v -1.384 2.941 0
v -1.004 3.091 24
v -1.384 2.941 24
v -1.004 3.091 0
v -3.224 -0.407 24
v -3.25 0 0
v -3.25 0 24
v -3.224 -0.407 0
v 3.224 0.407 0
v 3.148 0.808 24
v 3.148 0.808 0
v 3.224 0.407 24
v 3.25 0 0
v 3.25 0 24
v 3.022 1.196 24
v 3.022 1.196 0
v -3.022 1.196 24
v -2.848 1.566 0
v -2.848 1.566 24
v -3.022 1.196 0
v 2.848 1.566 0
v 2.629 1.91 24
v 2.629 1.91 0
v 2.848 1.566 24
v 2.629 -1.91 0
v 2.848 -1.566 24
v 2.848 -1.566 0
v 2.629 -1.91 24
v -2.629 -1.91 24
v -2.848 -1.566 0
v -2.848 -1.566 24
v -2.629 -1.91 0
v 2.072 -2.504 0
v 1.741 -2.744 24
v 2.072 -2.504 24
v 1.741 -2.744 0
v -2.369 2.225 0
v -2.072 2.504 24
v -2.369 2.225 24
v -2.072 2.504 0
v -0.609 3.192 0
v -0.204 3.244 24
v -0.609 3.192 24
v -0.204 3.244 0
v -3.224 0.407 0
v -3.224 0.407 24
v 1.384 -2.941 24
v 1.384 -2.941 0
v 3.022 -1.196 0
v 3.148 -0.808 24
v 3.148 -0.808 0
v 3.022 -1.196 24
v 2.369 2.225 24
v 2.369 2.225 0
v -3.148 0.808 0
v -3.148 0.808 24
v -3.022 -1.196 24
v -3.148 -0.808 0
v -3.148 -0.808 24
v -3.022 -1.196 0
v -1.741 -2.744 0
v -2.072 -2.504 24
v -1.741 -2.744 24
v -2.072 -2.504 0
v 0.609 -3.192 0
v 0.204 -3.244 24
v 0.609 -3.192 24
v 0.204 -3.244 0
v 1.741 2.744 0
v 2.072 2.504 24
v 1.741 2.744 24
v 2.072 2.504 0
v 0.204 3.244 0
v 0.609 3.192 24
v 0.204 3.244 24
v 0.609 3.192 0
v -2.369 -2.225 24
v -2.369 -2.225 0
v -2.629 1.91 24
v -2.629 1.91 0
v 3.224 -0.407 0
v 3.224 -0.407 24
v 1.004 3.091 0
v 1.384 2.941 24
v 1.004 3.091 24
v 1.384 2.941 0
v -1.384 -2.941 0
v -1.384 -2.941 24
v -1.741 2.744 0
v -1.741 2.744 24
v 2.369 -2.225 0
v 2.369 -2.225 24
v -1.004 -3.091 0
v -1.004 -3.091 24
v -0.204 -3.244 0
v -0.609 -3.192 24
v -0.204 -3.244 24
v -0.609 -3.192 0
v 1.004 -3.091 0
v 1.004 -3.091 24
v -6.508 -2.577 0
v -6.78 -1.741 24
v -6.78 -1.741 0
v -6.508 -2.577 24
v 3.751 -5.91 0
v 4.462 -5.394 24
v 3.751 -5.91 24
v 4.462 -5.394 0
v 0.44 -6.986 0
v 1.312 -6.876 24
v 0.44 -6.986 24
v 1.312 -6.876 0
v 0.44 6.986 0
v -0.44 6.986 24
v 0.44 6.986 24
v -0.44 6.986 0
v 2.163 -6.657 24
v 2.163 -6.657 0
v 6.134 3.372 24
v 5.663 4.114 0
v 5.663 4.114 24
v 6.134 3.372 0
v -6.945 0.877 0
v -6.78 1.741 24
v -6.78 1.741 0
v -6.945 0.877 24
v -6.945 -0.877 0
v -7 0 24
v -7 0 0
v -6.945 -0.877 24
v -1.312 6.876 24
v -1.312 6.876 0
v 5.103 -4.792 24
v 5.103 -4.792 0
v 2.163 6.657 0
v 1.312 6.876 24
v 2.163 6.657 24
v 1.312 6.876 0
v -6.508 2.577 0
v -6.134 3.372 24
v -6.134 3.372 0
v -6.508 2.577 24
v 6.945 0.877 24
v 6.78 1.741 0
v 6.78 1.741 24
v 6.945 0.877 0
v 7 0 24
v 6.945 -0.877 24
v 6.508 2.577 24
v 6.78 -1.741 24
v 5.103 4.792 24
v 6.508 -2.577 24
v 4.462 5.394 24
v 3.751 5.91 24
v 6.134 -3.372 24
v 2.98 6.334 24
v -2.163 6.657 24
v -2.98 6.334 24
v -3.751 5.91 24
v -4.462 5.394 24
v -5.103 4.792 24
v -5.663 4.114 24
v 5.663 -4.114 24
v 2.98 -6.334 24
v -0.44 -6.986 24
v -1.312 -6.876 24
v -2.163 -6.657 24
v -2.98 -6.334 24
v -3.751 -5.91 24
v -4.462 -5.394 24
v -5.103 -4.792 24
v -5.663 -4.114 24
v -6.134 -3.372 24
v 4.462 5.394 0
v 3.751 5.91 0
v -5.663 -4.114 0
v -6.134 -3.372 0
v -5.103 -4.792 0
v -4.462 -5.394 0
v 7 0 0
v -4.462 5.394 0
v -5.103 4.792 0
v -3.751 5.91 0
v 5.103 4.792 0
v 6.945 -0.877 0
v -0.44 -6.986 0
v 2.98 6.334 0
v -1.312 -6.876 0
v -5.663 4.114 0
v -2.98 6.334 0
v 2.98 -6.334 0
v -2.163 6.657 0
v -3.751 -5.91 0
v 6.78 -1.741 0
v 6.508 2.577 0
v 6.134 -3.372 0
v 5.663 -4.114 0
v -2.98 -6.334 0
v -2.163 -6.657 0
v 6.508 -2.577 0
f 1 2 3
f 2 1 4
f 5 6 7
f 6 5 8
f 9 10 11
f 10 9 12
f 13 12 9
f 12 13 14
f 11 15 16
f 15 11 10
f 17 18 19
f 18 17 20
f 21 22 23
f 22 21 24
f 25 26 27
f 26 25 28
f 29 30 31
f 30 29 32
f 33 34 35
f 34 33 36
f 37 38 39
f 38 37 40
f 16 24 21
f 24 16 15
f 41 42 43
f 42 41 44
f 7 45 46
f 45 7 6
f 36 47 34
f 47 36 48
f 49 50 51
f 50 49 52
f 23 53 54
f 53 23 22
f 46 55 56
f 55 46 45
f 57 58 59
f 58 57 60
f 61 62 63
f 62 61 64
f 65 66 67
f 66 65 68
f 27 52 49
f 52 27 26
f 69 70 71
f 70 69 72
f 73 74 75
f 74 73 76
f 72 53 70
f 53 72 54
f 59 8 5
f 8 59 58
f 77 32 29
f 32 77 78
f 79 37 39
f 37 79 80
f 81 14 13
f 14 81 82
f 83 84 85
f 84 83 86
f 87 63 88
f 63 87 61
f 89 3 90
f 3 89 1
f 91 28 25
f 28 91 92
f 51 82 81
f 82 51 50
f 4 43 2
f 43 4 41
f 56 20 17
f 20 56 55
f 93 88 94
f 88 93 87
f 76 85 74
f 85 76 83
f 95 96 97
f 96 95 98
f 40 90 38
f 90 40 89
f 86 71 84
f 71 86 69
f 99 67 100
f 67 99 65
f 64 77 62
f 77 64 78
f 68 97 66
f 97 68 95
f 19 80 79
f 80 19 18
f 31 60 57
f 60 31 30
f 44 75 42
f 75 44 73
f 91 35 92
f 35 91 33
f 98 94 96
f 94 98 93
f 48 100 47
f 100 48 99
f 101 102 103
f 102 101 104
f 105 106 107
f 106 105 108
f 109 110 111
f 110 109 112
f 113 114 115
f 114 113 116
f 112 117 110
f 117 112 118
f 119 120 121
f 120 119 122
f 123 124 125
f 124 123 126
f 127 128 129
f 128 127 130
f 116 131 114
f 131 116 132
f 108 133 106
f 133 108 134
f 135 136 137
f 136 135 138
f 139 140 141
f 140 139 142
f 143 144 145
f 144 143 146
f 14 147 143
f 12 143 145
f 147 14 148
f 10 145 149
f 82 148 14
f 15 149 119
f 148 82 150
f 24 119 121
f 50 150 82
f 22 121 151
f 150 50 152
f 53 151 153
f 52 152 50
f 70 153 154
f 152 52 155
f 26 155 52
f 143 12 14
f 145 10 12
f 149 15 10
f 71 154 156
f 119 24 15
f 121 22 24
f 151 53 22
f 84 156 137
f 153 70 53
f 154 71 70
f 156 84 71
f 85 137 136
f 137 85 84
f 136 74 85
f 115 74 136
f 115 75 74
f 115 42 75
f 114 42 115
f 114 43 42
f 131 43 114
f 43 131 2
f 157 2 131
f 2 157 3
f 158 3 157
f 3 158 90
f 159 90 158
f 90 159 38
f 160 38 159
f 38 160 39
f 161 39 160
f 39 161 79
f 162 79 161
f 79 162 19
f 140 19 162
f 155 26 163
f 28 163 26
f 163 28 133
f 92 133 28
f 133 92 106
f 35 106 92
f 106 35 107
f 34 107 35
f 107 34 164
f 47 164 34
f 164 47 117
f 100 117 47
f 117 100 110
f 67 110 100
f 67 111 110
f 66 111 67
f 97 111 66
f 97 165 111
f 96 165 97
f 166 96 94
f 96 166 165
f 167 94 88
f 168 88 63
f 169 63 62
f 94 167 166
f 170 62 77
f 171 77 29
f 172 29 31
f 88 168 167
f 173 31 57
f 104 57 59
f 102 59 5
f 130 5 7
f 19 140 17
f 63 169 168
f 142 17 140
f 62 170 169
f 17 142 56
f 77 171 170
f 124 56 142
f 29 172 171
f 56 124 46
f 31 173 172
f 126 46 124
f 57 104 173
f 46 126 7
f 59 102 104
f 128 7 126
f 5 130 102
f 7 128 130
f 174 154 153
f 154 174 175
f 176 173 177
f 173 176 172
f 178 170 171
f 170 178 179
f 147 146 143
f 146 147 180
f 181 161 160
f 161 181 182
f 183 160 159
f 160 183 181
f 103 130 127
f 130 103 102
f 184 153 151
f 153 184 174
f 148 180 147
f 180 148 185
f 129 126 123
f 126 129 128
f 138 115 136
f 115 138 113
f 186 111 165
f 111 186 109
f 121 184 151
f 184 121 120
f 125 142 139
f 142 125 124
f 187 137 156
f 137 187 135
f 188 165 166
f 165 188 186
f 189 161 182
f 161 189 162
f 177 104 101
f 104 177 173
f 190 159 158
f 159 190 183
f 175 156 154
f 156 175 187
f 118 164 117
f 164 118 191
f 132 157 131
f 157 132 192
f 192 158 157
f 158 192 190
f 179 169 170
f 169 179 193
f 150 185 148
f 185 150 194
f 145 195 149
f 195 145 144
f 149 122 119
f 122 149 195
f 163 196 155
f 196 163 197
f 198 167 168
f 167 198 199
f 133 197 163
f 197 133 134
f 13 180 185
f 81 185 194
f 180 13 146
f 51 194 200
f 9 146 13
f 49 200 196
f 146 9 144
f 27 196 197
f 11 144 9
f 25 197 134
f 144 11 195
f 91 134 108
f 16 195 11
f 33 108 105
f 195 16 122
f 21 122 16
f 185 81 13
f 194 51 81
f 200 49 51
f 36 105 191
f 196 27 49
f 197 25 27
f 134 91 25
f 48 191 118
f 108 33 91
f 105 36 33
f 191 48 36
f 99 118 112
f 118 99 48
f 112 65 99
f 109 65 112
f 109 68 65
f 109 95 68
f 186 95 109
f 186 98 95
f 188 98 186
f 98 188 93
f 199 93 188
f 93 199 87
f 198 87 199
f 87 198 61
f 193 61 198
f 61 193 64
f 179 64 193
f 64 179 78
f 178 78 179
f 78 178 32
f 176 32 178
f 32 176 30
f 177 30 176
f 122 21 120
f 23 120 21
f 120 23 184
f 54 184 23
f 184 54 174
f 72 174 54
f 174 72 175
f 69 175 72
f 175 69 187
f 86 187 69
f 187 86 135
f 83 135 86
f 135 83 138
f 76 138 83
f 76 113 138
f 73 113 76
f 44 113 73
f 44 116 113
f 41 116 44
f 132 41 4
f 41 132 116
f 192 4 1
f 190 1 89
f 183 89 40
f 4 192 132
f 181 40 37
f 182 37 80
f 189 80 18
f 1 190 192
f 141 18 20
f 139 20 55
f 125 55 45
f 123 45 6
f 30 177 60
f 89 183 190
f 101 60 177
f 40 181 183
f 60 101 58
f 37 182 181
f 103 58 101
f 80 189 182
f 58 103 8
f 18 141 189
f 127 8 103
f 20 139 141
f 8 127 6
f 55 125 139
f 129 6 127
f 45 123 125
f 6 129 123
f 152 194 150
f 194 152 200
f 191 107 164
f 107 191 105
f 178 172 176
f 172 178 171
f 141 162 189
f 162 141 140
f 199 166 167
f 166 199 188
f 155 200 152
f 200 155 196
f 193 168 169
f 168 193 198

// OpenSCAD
$fn = 50;


difference() {
	union() {
		cylinder(h = 24, r = 7.0000000000);
	}
	union() {
		translate(v = [0.0000000000, 0.0000000000, -100.0000000000]) {
			cylinder(h = 200, r = 3.2500000000);
		}
		cylinder(h = 24, r = 1.8000000000);
		cylinder(h = 24, r = 1.8000000000);
		cylinder(h = 24, r = 1.8000000000);
	}
}
